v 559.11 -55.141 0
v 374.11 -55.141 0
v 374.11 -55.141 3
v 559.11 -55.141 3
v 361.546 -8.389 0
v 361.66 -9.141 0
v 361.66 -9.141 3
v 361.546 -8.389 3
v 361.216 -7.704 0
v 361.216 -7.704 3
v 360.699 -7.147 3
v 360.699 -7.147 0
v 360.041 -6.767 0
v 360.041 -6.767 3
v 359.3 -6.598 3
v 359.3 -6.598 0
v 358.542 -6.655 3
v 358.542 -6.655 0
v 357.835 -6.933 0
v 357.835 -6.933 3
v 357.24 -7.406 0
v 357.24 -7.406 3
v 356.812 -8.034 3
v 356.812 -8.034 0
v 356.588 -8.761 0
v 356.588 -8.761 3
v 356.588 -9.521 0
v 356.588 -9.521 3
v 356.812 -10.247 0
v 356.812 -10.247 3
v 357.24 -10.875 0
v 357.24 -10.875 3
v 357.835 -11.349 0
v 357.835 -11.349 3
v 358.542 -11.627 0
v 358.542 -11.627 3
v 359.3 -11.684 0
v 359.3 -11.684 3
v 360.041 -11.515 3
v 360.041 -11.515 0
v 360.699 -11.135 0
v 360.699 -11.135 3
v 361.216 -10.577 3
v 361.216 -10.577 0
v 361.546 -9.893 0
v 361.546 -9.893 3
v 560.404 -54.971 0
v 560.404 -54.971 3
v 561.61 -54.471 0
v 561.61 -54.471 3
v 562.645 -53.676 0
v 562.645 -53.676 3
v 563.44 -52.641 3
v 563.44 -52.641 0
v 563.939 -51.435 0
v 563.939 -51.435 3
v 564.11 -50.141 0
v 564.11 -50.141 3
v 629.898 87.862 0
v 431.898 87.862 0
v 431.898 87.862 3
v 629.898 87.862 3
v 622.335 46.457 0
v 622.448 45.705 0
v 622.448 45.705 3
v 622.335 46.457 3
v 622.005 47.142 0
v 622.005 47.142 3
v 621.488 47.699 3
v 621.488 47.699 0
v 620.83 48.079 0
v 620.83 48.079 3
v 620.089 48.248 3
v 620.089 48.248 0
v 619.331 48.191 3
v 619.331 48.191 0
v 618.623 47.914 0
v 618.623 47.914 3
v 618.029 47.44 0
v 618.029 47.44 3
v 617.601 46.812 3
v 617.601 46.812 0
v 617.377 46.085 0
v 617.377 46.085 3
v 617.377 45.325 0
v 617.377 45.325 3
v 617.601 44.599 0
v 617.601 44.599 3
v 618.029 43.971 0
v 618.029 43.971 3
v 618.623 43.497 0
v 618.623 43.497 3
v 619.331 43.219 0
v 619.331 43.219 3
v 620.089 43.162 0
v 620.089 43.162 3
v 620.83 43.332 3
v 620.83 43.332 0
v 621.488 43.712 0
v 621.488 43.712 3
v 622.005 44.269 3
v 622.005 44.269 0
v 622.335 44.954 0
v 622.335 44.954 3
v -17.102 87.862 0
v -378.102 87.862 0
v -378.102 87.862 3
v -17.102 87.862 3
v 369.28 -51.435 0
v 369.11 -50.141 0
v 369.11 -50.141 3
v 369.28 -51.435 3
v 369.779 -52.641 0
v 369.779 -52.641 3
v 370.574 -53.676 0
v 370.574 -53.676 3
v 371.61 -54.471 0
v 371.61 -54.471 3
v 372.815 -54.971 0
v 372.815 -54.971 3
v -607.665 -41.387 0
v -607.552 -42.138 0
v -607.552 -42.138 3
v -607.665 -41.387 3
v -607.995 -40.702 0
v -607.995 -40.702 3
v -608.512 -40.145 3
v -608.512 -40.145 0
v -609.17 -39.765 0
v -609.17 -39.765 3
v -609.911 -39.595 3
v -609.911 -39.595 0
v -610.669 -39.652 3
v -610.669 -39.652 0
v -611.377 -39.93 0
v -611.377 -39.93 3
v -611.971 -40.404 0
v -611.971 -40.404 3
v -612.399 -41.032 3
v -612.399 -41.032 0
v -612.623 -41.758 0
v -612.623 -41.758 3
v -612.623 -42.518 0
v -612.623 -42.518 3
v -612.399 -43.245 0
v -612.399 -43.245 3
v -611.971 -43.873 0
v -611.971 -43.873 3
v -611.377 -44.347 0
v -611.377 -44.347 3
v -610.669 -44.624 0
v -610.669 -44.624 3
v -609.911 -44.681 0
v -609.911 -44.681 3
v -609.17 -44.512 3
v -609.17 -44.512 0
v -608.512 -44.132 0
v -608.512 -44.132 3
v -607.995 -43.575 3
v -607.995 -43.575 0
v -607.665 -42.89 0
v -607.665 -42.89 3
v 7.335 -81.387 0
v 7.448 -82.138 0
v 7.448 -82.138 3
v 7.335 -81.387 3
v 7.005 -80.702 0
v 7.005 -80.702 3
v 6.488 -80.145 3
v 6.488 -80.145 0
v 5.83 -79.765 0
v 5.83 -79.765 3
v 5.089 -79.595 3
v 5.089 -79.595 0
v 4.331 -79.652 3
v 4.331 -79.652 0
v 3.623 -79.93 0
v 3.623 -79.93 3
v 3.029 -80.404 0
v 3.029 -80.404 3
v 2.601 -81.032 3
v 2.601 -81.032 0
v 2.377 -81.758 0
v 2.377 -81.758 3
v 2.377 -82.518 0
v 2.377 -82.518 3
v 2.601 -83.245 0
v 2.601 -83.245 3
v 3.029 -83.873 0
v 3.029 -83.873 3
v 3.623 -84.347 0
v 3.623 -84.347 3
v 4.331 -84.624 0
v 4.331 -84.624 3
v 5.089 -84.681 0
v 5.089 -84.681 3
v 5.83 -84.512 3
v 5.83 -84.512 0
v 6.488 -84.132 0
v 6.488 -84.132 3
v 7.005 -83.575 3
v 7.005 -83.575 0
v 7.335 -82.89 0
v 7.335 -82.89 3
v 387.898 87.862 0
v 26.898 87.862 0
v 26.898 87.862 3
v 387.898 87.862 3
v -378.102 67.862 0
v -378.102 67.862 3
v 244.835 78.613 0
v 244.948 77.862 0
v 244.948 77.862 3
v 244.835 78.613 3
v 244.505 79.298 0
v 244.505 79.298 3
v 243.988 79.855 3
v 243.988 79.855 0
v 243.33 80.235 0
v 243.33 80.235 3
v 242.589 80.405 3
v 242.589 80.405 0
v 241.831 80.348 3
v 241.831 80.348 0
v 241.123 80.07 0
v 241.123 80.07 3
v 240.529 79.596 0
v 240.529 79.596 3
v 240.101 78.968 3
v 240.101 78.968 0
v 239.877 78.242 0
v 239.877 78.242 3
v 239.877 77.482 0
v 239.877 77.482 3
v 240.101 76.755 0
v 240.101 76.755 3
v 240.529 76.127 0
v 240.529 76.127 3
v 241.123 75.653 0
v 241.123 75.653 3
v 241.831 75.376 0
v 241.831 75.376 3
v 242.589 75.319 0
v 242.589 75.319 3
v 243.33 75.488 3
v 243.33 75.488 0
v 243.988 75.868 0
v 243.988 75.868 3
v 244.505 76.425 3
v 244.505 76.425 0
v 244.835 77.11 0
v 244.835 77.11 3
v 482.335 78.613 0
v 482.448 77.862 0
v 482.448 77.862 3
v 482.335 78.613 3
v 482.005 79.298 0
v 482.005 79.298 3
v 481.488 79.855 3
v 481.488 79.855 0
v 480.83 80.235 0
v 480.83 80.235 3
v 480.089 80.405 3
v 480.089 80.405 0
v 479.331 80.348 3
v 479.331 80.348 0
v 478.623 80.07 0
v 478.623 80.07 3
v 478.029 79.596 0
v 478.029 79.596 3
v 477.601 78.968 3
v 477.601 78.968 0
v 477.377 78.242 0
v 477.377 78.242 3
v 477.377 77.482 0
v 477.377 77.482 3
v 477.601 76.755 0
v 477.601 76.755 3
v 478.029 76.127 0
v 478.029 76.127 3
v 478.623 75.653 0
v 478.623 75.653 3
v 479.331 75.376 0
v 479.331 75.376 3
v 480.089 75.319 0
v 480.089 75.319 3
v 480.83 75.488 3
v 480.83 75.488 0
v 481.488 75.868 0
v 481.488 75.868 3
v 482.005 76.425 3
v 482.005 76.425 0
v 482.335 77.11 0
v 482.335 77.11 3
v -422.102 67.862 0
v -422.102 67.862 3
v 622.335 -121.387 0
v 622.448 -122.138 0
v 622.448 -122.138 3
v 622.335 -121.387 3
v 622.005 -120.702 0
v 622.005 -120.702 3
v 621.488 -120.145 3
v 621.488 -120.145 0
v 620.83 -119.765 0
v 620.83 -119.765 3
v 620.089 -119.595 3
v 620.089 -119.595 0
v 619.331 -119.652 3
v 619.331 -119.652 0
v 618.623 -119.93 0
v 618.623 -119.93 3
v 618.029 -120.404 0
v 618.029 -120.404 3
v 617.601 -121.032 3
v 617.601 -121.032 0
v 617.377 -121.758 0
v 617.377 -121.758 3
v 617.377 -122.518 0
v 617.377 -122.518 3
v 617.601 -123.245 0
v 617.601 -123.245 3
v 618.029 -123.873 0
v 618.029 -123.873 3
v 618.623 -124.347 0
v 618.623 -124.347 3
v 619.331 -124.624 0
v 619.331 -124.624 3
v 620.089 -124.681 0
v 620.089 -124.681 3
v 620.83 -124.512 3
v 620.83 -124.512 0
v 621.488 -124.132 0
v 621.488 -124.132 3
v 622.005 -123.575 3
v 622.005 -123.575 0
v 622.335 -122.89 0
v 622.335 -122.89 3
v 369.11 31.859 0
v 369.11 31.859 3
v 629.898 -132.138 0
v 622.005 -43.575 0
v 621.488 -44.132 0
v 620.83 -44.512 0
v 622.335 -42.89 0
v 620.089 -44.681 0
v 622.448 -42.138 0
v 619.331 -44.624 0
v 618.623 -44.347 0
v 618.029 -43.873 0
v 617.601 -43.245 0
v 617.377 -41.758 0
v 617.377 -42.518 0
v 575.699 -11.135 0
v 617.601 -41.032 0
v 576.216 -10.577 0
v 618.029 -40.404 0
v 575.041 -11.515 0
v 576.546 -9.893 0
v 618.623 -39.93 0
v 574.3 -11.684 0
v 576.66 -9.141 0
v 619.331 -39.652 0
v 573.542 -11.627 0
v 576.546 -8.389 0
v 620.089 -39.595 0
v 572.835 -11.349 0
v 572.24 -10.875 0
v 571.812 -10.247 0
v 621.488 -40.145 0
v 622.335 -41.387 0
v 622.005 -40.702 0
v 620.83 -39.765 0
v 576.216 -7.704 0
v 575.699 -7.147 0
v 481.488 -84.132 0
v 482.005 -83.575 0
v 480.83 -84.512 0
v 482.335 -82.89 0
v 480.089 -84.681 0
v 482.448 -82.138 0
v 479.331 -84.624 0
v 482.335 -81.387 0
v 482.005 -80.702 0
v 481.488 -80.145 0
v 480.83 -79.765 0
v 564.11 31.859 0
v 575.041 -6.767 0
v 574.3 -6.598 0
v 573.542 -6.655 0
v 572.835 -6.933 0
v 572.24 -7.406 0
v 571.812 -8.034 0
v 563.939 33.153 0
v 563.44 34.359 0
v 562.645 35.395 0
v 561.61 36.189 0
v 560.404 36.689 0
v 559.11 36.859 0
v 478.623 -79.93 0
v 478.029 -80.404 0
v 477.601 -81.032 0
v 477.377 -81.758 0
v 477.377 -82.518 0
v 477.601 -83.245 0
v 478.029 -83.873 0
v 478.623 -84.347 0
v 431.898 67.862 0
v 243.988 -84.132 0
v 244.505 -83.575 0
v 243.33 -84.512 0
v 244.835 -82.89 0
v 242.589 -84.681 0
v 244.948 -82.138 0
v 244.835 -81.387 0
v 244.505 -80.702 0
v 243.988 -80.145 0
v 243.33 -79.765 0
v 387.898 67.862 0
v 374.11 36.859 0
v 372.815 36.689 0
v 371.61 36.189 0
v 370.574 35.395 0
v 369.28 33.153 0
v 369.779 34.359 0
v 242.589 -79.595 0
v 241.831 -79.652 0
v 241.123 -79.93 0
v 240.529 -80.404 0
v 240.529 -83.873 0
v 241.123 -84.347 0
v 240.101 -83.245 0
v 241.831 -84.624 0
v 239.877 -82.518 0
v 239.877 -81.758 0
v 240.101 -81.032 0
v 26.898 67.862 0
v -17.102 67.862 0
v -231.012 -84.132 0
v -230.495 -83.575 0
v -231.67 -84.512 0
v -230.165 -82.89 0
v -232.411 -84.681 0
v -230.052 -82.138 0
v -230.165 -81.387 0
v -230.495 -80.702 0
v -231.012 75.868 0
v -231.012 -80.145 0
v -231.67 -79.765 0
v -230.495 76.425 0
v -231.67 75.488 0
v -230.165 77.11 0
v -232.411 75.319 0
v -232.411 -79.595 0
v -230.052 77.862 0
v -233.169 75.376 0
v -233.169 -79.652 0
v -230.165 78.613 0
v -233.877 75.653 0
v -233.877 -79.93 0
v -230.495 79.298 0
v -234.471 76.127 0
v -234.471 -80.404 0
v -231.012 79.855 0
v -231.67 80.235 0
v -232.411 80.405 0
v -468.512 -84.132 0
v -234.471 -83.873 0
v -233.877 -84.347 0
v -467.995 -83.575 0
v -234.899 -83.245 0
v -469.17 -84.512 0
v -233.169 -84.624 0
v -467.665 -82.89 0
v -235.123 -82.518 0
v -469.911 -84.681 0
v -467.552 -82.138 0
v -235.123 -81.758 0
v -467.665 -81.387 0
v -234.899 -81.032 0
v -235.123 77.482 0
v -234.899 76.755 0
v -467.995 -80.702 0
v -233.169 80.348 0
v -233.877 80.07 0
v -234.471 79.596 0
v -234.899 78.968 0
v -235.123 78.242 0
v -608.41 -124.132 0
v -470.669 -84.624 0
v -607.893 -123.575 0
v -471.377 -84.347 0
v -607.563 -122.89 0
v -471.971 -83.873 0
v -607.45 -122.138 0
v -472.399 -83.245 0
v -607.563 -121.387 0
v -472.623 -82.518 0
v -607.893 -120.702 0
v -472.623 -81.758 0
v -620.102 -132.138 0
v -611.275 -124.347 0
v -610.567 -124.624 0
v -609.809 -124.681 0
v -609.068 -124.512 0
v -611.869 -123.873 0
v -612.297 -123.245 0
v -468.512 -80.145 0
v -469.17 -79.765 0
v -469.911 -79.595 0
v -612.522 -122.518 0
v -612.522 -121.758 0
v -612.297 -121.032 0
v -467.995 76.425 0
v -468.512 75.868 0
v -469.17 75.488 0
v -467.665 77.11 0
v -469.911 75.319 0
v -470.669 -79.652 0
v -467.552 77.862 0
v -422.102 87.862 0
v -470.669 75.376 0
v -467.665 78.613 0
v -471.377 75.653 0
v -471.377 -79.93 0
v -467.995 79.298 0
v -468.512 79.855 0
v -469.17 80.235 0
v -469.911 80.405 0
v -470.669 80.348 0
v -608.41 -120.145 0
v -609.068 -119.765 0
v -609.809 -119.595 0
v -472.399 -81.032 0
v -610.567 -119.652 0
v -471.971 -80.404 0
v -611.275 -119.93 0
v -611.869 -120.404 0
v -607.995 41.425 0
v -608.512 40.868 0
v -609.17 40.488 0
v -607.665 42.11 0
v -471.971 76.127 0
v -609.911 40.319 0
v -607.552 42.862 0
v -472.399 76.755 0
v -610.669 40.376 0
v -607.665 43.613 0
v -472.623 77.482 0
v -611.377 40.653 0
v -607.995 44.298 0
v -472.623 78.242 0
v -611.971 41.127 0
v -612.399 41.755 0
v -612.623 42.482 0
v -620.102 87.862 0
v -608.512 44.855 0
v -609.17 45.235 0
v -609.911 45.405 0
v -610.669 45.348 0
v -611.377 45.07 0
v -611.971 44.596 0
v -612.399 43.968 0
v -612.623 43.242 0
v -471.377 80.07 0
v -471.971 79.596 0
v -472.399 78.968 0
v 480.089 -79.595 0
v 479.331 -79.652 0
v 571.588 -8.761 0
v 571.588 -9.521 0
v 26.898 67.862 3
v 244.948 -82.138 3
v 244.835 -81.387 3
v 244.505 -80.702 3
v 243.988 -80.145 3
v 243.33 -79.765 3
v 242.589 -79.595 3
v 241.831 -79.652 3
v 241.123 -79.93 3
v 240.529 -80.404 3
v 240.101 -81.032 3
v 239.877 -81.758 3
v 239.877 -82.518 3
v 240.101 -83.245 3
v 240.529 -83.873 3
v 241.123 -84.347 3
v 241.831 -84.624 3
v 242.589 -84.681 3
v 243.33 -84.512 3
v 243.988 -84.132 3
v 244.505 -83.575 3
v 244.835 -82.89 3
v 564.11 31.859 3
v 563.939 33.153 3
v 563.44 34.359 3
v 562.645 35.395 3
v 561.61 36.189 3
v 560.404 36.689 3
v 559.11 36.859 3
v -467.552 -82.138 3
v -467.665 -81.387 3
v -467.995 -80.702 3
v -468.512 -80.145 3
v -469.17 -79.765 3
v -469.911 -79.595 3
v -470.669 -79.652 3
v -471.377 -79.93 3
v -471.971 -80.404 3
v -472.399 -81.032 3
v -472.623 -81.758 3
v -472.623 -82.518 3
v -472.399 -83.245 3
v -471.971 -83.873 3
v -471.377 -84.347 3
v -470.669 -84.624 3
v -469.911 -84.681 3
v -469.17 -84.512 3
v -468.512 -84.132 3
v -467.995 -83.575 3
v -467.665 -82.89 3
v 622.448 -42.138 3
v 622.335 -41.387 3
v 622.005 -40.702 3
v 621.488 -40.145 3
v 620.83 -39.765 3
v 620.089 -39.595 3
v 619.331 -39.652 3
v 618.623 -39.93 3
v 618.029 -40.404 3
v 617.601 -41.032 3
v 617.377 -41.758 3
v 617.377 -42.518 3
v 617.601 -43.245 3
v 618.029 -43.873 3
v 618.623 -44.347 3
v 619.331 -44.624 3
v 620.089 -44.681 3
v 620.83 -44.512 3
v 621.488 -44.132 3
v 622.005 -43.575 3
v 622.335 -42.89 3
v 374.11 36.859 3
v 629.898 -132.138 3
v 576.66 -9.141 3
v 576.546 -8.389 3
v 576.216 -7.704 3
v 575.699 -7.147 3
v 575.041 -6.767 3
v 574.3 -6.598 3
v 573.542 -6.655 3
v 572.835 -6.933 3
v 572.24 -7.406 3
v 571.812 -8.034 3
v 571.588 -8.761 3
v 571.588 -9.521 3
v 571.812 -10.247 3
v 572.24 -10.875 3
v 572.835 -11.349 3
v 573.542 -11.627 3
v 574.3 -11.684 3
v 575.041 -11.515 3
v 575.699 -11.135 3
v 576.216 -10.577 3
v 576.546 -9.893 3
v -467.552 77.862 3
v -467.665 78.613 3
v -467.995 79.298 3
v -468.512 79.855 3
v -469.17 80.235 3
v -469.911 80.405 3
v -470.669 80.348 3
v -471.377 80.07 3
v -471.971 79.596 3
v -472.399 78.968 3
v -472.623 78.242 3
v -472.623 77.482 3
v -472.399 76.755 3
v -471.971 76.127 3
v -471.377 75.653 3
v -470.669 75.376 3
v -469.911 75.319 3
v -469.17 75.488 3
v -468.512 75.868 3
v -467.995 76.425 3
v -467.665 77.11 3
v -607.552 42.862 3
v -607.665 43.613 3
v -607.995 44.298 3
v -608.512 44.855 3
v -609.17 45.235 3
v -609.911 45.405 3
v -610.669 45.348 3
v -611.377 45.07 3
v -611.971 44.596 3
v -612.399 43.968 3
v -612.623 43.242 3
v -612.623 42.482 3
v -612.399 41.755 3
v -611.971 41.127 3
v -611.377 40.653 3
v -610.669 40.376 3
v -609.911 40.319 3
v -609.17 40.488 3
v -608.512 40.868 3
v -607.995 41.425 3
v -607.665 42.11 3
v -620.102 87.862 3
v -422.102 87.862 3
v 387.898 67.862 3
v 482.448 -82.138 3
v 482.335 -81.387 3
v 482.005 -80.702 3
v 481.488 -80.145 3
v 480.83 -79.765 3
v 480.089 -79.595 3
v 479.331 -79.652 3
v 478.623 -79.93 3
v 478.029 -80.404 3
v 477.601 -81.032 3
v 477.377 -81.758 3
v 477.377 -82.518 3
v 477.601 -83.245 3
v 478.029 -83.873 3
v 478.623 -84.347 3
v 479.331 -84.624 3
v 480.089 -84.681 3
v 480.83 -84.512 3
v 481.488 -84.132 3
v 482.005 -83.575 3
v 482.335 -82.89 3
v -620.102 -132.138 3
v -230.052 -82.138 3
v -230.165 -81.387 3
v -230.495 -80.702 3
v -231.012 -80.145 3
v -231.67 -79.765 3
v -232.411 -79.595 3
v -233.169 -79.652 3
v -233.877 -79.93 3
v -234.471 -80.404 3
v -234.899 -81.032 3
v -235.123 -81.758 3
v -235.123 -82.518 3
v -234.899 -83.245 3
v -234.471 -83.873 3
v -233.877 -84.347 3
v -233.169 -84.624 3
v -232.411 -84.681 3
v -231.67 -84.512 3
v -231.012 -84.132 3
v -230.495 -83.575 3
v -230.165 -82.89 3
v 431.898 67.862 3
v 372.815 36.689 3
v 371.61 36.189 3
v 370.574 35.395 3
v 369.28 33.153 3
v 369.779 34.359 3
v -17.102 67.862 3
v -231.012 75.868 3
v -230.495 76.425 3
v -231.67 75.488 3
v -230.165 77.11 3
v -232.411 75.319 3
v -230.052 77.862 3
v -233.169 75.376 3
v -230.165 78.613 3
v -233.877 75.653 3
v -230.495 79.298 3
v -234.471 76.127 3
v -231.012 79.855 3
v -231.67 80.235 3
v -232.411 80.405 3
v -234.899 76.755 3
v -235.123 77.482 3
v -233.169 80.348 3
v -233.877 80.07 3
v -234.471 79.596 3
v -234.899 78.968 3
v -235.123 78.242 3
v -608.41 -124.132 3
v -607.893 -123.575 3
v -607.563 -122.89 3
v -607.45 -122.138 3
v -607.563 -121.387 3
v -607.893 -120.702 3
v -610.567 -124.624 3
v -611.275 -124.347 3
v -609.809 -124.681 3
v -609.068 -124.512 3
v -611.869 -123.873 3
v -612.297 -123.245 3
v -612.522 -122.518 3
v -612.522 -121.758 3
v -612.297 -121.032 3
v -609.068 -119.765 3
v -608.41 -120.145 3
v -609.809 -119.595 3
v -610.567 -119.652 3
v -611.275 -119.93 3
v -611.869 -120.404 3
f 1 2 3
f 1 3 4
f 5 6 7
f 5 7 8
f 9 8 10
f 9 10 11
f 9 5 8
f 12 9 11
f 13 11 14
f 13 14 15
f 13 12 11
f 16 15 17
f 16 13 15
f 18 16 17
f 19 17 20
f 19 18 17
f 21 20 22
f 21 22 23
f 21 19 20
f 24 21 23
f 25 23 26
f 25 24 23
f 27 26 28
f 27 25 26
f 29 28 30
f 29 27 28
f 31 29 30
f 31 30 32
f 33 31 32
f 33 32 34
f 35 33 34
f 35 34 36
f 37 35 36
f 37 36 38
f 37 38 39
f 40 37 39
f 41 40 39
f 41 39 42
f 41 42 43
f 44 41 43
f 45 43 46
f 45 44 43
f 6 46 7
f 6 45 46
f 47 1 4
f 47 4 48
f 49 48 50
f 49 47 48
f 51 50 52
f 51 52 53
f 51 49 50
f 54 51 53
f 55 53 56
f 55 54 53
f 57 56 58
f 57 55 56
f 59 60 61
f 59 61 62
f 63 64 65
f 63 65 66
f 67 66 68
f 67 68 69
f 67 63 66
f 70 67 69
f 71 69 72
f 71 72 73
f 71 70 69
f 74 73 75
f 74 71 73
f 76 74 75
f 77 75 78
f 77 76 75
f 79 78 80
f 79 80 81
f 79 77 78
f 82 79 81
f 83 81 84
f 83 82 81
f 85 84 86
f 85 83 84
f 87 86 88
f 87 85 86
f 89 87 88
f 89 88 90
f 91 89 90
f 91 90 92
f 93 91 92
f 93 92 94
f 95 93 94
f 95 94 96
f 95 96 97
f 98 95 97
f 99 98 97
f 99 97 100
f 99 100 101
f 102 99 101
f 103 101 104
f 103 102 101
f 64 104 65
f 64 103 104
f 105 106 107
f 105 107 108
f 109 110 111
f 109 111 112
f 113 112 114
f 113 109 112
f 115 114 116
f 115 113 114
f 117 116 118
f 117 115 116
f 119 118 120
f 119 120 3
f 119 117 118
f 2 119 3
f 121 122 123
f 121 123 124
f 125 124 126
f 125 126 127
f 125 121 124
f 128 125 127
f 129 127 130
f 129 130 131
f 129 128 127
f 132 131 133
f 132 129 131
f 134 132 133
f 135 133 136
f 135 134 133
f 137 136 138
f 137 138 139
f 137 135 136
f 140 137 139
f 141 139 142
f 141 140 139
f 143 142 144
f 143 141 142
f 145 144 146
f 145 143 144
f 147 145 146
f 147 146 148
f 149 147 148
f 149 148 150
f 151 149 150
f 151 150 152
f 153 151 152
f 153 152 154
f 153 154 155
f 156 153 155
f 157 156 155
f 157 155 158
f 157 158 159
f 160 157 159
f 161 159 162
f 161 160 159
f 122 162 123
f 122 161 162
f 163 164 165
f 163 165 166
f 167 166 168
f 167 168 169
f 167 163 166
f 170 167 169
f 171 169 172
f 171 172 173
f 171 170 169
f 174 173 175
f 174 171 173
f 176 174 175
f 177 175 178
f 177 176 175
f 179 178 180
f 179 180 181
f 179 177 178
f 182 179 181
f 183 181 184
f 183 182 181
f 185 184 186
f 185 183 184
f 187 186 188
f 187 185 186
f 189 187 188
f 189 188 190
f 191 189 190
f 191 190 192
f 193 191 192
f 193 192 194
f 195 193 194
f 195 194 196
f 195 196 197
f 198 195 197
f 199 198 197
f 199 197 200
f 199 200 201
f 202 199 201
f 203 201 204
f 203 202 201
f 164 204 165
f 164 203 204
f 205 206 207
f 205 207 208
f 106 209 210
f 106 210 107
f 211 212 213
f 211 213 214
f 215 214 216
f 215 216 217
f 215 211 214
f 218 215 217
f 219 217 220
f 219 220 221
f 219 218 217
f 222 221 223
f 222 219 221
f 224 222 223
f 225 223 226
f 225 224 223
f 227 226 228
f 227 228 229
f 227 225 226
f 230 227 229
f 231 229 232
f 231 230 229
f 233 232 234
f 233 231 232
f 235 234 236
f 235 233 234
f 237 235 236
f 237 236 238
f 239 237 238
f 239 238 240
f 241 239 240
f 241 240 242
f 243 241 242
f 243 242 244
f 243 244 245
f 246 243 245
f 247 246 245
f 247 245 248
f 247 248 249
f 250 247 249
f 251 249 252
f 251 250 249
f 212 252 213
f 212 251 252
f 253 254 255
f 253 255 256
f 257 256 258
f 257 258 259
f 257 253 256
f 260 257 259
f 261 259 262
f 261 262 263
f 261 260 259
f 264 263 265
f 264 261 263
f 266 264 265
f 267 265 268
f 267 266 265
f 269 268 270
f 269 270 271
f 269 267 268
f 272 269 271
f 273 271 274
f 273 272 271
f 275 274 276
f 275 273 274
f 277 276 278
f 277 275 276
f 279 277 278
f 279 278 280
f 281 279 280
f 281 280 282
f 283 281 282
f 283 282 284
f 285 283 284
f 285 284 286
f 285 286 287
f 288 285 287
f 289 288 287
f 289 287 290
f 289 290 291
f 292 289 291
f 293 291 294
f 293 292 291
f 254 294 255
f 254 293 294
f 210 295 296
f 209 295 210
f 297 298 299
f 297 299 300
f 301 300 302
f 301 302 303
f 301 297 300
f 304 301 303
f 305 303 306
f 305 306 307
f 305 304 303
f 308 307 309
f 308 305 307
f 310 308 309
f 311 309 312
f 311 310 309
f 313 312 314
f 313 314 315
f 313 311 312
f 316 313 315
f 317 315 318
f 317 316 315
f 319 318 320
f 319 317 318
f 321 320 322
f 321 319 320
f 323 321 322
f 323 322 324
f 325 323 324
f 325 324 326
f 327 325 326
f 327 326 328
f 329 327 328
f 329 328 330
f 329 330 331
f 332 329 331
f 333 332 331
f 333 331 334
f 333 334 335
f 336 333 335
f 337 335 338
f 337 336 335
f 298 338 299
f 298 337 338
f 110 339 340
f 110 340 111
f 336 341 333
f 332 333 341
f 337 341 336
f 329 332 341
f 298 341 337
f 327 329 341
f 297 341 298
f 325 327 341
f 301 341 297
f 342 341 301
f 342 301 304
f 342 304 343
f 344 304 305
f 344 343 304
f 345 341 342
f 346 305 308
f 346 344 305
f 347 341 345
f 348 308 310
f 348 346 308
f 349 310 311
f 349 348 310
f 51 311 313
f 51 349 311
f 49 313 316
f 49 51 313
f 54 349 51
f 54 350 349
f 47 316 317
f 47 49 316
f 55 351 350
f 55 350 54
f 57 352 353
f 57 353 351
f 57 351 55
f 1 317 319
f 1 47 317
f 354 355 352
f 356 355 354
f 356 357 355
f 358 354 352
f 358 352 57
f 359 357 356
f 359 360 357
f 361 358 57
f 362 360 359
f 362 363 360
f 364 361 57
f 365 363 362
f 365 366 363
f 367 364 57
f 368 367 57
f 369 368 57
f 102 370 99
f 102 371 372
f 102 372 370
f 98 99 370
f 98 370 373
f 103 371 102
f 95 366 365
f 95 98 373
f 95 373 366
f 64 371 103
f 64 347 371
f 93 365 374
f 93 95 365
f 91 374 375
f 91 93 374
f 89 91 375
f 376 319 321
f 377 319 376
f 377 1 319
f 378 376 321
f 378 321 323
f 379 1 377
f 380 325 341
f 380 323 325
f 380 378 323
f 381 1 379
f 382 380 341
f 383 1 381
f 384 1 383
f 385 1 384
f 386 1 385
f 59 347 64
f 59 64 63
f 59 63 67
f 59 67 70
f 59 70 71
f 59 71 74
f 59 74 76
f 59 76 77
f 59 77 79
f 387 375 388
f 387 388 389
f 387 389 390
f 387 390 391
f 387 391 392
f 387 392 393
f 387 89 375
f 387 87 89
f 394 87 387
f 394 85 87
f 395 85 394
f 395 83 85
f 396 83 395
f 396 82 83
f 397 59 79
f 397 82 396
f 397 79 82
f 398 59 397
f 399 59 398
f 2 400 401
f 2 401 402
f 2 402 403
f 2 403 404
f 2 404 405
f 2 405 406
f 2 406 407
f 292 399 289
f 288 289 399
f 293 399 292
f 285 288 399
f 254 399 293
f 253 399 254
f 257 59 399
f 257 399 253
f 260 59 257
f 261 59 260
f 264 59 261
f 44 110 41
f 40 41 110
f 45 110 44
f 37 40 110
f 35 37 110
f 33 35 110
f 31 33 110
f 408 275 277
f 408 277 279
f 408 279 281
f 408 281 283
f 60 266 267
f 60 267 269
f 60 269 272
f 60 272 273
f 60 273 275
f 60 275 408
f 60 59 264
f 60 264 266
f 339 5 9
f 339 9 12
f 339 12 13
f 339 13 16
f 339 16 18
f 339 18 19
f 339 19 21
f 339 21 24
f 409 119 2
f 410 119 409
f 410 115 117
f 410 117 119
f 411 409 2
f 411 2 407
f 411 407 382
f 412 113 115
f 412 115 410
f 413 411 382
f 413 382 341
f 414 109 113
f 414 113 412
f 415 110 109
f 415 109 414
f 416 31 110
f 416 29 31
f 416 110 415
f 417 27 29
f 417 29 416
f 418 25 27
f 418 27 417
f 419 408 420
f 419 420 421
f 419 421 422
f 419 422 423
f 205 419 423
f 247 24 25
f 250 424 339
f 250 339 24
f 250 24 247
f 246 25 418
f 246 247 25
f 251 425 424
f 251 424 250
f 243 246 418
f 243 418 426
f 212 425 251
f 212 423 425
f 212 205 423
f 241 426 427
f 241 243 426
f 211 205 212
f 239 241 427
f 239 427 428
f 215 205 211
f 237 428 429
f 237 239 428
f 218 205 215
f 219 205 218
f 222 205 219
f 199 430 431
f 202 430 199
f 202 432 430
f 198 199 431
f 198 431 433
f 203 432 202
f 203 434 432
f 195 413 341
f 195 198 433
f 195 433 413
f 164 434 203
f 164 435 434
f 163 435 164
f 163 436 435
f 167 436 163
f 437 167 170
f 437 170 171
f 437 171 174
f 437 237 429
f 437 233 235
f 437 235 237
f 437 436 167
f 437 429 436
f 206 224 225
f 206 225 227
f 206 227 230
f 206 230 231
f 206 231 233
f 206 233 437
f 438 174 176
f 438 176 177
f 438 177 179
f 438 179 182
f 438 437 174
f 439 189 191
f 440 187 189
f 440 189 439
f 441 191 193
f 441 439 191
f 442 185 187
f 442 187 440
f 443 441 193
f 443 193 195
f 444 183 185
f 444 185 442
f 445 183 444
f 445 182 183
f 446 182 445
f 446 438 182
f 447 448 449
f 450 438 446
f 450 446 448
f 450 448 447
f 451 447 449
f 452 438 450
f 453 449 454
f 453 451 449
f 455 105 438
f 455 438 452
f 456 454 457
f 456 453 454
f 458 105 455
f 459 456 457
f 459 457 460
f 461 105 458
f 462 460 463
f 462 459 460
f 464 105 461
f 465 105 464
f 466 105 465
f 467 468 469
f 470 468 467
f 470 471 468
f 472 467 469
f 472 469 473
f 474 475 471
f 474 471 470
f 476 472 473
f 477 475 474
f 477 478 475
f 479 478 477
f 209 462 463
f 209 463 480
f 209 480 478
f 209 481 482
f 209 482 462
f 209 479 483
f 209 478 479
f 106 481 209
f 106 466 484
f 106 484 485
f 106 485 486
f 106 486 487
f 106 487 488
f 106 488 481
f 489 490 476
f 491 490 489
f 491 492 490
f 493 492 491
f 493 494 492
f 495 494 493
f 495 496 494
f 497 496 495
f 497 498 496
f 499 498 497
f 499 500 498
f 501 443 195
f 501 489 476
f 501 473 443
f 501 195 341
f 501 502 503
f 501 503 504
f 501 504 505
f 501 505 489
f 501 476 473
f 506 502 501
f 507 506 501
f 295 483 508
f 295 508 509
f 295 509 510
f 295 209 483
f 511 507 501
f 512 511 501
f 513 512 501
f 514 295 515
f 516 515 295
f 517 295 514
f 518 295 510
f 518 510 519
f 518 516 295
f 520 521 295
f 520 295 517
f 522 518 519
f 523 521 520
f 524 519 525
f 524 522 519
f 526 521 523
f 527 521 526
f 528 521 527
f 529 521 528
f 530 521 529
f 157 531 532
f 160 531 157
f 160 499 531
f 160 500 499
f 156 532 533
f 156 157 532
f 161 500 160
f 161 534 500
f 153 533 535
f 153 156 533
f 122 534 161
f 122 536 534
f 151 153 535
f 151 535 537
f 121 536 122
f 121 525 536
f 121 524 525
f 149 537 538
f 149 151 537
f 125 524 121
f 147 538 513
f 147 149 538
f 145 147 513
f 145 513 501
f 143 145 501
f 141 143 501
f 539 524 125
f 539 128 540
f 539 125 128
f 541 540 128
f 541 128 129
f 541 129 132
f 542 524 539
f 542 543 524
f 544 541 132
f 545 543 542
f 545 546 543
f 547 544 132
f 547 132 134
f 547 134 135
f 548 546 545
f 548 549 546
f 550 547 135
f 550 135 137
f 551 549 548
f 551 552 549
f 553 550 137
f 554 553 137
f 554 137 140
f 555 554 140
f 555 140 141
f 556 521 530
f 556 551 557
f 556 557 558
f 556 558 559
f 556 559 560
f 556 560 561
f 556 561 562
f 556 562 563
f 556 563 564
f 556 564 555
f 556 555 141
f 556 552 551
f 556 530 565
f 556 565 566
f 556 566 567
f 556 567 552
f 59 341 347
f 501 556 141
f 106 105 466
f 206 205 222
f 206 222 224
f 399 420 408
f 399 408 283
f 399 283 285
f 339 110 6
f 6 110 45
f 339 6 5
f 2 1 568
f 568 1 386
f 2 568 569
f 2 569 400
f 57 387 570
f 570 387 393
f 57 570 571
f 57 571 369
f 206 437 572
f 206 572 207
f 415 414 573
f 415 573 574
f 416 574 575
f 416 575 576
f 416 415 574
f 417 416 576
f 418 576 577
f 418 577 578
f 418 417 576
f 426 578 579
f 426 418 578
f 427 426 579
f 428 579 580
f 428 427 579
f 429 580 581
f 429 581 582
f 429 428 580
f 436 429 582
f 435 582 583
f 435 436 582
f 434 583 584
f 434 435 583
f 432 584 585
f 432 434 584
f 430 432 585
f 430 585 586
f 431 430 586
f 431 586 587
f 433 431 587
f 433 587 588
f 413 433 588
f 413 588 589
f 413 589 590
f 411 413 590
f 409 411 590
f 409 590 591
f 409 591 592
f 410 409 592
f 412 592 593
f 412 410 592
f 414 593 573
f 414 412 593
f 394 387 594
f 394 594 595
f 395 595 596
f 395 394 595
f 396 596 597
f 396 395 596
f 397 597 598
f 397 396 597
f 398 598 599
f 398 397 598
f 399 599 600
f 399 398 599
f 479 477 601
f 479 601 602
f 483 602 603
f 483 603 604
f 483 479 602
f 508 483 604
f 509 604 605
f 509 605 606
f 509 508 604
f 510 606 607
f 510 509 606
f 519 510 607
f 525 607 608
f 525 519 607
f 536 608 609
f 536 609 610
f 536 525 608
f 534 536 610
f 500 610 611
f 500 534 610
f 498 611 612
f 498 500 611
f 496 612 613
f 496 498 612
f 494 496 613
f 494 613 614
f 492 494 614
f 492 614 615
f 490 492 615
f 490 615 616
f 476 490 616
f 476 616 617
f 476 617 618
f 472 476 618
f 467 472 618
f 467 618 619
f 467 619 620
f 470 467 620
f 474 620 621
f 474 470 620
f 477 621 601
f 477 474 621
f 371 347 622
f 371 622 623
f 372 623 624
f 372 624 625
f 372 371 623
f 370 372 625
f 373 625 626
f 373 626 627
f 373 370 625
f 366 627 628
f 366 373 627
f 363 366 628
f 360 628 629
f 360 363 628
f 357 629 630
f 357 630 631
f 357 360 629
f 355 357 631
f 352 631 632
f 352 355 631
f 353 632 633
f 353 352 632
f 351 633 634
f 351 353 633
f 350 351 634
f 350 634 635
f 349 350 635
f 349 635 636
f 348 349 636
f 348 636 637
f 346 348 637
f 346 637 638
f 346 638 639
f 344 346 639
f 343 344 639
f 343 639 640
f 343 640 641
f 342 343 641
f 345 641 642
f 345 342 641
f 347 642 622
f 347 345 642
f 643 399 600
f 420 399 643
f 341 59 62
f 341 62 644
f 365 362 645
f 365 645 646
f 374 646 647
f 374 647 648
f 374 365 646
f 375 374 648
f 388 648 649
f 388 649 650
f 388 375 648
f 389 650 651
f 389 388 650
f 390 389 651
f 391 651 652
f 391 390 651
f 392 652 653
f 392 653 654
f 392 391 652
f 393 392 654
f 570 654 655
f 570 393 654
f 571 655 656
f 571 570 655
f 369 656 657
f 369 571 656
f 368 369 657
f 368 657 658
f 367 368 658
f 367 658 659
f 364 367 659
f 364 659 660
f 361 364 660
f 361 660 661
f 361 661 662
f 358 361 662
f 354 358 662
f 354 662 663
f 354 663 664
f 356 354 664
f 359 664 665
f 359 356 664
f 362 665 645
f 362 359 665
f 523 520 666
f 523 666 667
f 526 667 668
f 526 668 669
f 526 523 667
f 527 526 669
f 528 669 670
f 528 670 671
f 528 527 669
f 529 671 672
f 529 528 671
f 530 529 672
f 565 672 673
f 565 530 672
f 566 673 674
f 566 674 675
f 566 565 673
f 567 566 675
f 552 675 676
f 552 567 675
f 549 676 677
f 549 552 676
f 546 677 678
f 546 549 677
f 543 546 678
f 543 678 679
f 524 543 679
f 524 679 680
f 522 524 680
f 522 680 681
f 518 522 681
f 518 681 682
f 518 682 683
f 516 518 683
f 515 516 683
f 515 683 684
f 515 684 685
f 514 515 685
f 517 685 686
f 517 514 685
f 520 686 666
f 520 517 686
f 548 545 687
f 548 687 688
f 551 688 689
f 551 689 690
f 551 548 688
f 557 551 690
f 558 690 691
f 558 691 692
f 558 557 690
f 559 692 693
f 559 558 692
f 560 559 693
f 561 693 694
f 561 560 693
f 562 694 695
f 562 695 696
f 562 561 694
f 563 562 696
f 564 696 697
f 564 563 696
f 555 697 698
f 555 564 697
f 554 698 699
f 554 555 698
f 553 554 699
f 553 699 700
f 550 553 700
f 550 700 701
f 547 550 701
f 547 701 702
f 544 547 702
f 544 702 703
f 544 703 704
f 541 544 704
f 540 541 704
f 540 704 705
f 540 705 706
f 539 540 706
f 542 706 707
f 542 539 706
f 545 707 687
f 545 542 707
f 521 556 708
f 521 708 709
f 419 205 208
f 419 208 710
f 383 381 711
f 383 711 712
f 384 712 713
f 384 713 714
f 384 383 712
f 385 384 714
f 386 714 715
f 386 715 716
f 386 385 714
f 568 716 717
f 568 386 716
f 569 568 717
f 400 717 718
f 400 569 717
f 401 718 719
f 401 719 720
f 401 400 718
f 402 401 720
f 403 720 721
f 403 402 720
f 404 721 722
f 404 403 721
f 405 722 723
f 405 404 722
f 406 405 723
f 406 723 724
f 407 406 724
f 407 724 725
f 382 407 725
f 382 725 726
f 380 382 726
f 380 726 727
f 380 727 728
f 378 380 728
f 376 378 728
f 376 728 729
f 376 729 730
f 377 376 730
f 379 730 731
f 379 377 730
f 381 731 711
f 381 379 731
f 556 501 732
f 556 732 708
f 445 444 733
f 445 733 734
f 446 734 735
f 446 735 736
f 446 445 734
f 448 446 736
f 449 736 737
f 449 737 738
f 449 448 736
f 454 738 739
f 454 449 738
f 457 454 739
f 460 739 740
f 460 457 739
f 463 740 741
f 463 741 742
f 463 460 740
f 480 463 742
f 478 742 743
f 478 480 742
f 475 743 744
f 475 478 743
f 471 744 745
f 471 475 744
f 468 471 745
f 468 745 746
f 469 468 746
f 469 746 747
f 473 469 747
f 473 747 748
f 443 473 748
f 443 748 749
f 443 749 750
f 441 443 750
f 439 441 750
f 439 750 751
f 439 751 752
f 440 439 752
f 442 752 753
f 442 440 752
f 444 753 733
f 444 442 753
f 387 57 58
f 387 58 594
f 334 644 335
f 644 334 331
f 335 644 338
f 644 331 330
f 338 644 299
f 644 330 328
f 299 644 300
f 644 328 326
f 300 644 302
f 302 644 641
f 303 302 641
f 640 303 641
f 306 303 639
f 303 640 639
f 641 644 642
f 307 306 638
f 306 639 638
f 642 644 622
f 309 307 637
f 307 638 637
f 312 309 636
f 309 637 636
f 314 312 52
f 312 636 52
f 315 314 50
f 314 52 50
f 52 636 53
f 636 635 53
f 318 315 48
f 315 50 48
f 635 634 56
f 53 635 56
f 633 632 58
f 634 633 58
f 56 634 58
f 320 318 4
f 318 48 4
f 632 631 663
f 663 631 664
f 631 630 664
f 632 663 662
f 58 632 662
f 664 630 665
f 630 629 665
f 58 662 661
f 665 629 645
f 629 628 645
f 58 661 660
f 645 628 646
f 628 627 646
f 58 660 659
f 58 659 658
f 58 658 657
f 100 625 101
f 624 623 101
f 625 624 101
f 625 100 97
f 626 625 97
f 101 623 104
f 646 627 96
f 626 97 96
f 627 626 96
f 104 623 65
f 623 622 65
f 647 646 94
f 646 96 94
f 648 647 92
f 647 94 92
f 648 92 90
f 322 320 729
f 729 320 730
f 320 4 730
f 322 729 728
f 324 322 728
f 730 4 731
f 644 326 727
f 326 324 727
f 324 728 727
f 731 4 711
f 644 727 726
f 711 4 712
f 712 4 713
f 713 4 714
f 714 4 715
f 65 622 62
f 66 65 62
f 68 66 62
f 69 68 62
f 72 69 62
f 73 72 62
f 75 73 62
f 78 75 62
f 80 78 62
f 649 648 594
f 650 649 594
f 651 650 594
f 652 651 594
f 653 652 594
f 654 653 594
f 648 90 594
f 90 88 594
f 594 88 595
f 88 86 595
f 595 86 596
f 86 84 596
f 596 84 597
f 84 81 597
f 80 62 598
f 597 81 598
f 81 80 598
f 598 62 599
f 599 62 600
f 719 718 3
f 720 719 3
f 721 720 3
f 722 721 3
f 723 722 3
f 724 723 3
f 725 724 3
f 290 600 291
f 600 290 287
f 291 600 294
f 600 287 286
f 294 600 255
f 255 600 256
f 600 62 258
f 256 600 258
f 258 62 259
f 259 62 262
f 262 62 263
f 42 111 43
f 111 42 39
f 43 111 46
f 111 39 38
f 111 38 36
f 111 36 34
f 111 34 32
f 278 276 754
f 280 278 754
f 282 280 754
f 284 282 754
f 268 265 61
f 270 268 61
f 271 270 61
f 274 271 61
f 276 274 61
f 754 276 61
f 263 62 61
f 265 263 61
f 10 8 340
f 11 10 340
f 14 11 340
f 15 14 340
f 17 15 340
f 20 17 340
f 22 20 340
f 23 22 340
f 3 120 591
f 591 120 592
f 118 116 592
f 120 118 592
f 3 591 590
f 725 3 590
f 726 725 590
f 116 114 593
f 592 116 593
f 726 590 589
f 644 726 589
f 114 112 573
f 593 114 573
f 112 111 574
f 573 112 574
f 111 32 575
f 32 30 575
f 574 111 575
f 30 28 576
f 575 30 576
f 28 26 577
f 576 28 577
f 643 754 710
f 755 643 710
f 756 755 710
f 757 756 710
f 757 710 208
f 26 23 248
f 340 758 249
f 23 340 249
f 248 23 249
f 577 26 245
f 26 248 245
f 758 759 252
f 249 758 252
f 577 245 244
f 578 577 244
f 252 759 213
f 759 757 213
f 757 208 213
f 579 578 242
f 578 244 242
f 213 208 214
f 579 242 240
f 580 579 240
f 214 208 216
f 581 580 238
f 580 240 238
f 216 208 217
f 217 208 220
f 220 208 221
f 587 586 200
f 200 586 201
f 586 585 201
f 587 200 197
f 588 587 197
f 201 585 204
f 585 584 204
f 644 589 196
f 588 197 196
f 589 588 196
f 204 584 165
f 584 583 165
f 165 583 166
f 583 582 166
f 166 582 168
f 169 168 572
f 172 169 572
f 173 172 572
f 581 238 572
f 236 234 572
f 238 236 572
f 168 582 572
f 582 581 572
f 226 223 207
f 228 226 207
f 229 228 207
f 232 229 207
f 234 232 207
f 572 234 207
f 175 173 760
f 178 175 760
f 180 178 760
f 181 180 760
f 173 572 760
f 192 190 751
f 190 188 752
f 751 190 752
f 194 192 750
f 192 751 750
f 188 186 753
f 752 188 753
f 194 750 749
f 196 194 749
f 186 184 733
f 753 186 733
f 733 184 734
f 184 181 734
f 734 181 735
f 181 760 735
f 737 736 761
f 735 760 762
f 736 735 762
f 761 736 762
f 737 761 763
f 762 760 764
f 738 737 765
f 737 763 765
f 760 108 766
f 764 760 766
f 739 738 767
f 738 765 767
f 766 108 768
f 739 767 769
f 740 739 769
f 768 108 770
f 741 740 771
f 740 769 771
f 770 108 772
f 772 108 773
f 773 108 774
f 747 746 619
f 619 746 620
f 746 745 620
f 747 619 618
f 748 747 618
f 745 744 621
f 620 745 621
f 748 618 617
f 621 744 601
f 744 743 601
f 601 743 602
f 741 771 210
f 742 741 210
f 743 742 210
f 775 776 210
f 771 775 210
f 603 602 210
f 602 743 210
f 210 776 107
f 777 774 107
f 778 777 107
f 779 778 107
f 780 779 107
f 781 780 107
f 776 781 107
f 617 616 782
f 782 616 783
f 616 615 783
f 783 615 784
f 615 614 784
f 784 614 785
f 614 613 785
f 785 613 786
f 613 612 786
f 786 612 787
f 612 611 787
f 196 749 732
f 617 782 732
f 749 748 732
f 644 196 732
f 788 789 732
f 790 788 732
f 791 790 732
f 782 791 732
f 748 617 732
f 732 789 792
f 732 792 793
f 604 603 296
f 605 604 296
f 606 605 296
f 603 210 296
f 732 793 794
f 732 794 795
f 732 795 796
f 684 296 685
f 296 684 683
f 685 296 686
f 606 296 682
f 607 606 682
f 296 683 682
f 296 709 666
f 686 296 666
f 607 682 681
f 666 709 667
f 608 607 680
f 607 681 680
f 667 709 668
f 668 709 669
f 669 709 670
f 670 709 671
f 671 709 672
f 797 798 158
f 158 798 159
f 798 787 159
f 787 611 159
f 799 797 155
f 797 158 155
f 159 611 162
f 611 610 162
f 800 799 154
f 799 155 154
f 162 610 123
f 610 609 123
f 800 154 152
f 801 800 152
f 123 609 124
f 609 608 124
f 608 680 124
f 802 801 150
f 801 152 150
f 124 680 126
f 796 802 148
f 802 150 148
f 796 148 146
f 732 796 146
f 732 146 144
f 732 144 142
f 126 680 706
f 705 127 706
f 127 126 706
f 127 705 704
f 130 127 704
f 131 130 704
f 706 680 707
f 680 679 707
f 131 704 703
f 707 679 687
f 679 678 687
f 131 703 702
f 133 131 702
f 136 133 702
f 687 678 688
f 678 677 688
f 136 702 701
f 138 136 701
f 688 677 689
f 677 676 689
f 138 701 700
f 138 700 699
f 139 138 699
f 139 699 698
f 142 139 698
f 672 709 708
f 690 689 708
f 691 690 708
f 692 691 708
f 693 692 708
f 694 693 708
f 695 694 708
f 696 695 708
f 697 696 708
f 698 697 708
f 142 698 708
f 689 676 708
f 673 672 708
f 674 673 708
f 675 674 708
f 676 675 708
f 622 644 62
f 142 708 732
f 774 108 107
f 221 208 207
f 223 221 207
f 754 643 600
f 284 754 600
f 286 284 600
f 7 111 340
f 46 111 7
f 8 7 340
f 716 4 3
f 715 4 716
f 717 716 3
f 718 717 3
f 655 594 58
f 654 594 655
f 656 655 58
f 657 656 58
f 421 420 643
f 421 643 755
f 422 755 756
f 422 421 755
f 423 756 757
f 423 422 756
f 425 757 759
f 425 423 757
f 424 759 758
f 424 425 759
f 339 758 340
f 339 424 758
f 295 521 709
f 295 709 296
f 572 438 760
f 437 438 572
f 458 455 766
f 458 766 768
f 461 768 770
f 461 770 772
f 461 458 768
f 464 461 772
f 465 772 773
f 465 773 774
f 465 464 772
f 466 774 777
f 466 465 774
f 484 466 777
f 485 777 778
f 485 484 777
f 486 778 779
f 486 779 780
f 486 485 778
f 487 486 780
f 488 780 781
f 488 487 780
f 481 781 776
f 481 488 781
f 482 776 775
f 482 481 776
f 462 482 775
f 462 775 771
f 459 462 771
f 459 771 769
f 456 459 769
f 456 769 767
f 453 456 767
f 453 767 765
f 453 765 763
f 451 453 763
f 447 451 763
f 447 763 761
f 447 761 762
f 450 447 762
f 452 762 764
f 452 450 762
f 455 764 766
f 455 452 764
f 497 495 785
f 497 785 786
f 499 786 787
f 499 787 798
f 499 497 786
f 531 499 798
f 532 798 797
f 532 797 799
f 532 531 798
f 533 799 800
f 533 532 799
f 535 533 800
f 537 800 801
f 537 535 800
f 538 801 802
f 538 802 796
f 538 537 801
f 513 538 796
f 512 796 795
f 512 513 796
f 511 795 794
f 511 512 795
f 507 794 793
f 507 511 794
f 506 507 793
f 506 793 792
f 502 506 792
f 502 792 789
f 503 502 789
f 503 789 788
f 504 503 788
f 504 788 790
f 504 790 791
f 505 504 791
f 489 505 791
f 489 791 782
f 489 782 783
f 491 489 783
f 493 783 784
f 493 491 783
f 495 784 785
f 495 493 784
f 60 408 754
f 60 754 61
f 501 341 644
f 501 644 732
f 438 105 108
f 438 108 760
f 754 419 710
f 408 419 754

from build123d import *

# Parameters (mm, degrees)
SKETCH1_R           = 2.55
BOSS_EXTRUDE1_DEPTH = 3


with BuildPart() as part:
    # Sketch1 → Boss-Extrude1 (new body)
    with BuildSketch(Plane.XY):
        Polygon((431.898025048, 87.861768757), (629.898025048, 87.861768757), (629.898025048, -132.138231243), (-620.101974952, -132.138231243), (-620.101974952, 87.861768757), (-422.101974952, 87.861768757), (-422.101974952, 67.861768757), (-378.101974952, 67.861768757), (-378.101974952, 87.861768757), (-17.101974952, 87.861768757), (-17.101974952, 67.861768757), (26.898025048, 67.861768757), (26.898025048, 87.861768757), (387.898025048, 87.861768757), (387.898025048, 67.861768757), (431.898025048, 67.861768757), align=None)
        with Locations((242.398025048, 77.861768757)):
            Circle(SKETCH1_R, mode=Mode.SUBTRACT)
        with Locations((-610.101974952, 42.861768757)):
            Circle(SKETCH1_R, mode=Mode.SUBTRACT)
        with Locations((-232.601974952, 77.861768757)):
            Circle(SKETCH1_R, mode=Mode.SUBTRACT)
        with Locations((-470.101974952, 77.861768757)):
            Circle(SKETCH1_R, mode=Mode.SUBTRACT)
        with Locations((479.898025048, 77.861768757)):
            Circle(SKETCH1_R, mode=Mode.SUBTRACT)
        with Locations((479.898025048, -82.138231243)):
            Circle(SKETCH1_R, mode=Mode.SUBTRACT)
        with Locations((242.398025048, -82.138231243)):
            Circle(SKETCH1_R, mode=Mode.SUBTRACT)
        with Locations((4.898025048, -82.138231243)):
            Circle(SKETCH1_R, mode=Mode.SUBTRACT)
        with Locations((-232.601974952, -82.138231243)):
            Circle(SKETCH1_R, mode=Mode.SUBTRACT)
        with Locations((-470.101974952, -82.138231243)):
            Circle(SKETCH1_R, mode=Mode.SUBTRACT)
        with Locations((619.898025048, -42.138231243)):
            Circle(SKETCH1_R, mode=Mode.SUBTRACT)
        with Locations((-610.101974952, -42.138231243)):
            Circle(SKETCH1_R, mode=Mode.SUBTRACT)
        with Locations((-610, -122.138231243)):
            Circle(SKETCH1_R, mode=Mode.SUBTRACT)
        with Locations((619.898025048, 45.705315607)):
            Circle(SKETCH1_R, mode=Mode.SUBTRACT)
        with Locations((619.898025048, -122.138231243)):
            Circle(SKETCH1_R, mode=Mode.SUBTRACT)
        with Locations((574.10958906, -9.140897424)):
            Circle(SKETCH1_R, mode=Mode.SUBTRACT)
        with Locations((359.10958906, -9.140897424)):
            Circle(SKETCH1_R, mode=Mode.SUBTRACT)
        with BuildLine():
            Line((559.10958906, 36.859102576), (374.10958906, 36.859102576))
            ThreePointArc((374.10958906, 36.859102576), (370.574055154, 35.394636482), (369.10958906, 31.859102576))
            Line((369.10958906, 31.859102576), (369.10958906, -50.140897424))
            ThreePointArc((369.10958906, -50.140897424), (370.574055154, -53.67643133), (374.10958906, -55.140897424))
            Line((374.10958906, -55.140897424), (559.10958906, -55.140897424))
            ThreePointArc((559.10958906, -55.140897424), (562.645122966, -53.67643133), (564.10958906, -50.140897424))
            Line((564.10958906, -50.140897424), (564.10958906, 31.859102576))
            ThreePointArc((564.10958906, 31.859102576), (562.645122966, 35.394636482), (559.10958906, 36.859102576))
        make_face(mode=Mode.SUBTRACT)
    extrude(amount=BOSS_EXTRUDE1_DEPTH)


solid = part.part
